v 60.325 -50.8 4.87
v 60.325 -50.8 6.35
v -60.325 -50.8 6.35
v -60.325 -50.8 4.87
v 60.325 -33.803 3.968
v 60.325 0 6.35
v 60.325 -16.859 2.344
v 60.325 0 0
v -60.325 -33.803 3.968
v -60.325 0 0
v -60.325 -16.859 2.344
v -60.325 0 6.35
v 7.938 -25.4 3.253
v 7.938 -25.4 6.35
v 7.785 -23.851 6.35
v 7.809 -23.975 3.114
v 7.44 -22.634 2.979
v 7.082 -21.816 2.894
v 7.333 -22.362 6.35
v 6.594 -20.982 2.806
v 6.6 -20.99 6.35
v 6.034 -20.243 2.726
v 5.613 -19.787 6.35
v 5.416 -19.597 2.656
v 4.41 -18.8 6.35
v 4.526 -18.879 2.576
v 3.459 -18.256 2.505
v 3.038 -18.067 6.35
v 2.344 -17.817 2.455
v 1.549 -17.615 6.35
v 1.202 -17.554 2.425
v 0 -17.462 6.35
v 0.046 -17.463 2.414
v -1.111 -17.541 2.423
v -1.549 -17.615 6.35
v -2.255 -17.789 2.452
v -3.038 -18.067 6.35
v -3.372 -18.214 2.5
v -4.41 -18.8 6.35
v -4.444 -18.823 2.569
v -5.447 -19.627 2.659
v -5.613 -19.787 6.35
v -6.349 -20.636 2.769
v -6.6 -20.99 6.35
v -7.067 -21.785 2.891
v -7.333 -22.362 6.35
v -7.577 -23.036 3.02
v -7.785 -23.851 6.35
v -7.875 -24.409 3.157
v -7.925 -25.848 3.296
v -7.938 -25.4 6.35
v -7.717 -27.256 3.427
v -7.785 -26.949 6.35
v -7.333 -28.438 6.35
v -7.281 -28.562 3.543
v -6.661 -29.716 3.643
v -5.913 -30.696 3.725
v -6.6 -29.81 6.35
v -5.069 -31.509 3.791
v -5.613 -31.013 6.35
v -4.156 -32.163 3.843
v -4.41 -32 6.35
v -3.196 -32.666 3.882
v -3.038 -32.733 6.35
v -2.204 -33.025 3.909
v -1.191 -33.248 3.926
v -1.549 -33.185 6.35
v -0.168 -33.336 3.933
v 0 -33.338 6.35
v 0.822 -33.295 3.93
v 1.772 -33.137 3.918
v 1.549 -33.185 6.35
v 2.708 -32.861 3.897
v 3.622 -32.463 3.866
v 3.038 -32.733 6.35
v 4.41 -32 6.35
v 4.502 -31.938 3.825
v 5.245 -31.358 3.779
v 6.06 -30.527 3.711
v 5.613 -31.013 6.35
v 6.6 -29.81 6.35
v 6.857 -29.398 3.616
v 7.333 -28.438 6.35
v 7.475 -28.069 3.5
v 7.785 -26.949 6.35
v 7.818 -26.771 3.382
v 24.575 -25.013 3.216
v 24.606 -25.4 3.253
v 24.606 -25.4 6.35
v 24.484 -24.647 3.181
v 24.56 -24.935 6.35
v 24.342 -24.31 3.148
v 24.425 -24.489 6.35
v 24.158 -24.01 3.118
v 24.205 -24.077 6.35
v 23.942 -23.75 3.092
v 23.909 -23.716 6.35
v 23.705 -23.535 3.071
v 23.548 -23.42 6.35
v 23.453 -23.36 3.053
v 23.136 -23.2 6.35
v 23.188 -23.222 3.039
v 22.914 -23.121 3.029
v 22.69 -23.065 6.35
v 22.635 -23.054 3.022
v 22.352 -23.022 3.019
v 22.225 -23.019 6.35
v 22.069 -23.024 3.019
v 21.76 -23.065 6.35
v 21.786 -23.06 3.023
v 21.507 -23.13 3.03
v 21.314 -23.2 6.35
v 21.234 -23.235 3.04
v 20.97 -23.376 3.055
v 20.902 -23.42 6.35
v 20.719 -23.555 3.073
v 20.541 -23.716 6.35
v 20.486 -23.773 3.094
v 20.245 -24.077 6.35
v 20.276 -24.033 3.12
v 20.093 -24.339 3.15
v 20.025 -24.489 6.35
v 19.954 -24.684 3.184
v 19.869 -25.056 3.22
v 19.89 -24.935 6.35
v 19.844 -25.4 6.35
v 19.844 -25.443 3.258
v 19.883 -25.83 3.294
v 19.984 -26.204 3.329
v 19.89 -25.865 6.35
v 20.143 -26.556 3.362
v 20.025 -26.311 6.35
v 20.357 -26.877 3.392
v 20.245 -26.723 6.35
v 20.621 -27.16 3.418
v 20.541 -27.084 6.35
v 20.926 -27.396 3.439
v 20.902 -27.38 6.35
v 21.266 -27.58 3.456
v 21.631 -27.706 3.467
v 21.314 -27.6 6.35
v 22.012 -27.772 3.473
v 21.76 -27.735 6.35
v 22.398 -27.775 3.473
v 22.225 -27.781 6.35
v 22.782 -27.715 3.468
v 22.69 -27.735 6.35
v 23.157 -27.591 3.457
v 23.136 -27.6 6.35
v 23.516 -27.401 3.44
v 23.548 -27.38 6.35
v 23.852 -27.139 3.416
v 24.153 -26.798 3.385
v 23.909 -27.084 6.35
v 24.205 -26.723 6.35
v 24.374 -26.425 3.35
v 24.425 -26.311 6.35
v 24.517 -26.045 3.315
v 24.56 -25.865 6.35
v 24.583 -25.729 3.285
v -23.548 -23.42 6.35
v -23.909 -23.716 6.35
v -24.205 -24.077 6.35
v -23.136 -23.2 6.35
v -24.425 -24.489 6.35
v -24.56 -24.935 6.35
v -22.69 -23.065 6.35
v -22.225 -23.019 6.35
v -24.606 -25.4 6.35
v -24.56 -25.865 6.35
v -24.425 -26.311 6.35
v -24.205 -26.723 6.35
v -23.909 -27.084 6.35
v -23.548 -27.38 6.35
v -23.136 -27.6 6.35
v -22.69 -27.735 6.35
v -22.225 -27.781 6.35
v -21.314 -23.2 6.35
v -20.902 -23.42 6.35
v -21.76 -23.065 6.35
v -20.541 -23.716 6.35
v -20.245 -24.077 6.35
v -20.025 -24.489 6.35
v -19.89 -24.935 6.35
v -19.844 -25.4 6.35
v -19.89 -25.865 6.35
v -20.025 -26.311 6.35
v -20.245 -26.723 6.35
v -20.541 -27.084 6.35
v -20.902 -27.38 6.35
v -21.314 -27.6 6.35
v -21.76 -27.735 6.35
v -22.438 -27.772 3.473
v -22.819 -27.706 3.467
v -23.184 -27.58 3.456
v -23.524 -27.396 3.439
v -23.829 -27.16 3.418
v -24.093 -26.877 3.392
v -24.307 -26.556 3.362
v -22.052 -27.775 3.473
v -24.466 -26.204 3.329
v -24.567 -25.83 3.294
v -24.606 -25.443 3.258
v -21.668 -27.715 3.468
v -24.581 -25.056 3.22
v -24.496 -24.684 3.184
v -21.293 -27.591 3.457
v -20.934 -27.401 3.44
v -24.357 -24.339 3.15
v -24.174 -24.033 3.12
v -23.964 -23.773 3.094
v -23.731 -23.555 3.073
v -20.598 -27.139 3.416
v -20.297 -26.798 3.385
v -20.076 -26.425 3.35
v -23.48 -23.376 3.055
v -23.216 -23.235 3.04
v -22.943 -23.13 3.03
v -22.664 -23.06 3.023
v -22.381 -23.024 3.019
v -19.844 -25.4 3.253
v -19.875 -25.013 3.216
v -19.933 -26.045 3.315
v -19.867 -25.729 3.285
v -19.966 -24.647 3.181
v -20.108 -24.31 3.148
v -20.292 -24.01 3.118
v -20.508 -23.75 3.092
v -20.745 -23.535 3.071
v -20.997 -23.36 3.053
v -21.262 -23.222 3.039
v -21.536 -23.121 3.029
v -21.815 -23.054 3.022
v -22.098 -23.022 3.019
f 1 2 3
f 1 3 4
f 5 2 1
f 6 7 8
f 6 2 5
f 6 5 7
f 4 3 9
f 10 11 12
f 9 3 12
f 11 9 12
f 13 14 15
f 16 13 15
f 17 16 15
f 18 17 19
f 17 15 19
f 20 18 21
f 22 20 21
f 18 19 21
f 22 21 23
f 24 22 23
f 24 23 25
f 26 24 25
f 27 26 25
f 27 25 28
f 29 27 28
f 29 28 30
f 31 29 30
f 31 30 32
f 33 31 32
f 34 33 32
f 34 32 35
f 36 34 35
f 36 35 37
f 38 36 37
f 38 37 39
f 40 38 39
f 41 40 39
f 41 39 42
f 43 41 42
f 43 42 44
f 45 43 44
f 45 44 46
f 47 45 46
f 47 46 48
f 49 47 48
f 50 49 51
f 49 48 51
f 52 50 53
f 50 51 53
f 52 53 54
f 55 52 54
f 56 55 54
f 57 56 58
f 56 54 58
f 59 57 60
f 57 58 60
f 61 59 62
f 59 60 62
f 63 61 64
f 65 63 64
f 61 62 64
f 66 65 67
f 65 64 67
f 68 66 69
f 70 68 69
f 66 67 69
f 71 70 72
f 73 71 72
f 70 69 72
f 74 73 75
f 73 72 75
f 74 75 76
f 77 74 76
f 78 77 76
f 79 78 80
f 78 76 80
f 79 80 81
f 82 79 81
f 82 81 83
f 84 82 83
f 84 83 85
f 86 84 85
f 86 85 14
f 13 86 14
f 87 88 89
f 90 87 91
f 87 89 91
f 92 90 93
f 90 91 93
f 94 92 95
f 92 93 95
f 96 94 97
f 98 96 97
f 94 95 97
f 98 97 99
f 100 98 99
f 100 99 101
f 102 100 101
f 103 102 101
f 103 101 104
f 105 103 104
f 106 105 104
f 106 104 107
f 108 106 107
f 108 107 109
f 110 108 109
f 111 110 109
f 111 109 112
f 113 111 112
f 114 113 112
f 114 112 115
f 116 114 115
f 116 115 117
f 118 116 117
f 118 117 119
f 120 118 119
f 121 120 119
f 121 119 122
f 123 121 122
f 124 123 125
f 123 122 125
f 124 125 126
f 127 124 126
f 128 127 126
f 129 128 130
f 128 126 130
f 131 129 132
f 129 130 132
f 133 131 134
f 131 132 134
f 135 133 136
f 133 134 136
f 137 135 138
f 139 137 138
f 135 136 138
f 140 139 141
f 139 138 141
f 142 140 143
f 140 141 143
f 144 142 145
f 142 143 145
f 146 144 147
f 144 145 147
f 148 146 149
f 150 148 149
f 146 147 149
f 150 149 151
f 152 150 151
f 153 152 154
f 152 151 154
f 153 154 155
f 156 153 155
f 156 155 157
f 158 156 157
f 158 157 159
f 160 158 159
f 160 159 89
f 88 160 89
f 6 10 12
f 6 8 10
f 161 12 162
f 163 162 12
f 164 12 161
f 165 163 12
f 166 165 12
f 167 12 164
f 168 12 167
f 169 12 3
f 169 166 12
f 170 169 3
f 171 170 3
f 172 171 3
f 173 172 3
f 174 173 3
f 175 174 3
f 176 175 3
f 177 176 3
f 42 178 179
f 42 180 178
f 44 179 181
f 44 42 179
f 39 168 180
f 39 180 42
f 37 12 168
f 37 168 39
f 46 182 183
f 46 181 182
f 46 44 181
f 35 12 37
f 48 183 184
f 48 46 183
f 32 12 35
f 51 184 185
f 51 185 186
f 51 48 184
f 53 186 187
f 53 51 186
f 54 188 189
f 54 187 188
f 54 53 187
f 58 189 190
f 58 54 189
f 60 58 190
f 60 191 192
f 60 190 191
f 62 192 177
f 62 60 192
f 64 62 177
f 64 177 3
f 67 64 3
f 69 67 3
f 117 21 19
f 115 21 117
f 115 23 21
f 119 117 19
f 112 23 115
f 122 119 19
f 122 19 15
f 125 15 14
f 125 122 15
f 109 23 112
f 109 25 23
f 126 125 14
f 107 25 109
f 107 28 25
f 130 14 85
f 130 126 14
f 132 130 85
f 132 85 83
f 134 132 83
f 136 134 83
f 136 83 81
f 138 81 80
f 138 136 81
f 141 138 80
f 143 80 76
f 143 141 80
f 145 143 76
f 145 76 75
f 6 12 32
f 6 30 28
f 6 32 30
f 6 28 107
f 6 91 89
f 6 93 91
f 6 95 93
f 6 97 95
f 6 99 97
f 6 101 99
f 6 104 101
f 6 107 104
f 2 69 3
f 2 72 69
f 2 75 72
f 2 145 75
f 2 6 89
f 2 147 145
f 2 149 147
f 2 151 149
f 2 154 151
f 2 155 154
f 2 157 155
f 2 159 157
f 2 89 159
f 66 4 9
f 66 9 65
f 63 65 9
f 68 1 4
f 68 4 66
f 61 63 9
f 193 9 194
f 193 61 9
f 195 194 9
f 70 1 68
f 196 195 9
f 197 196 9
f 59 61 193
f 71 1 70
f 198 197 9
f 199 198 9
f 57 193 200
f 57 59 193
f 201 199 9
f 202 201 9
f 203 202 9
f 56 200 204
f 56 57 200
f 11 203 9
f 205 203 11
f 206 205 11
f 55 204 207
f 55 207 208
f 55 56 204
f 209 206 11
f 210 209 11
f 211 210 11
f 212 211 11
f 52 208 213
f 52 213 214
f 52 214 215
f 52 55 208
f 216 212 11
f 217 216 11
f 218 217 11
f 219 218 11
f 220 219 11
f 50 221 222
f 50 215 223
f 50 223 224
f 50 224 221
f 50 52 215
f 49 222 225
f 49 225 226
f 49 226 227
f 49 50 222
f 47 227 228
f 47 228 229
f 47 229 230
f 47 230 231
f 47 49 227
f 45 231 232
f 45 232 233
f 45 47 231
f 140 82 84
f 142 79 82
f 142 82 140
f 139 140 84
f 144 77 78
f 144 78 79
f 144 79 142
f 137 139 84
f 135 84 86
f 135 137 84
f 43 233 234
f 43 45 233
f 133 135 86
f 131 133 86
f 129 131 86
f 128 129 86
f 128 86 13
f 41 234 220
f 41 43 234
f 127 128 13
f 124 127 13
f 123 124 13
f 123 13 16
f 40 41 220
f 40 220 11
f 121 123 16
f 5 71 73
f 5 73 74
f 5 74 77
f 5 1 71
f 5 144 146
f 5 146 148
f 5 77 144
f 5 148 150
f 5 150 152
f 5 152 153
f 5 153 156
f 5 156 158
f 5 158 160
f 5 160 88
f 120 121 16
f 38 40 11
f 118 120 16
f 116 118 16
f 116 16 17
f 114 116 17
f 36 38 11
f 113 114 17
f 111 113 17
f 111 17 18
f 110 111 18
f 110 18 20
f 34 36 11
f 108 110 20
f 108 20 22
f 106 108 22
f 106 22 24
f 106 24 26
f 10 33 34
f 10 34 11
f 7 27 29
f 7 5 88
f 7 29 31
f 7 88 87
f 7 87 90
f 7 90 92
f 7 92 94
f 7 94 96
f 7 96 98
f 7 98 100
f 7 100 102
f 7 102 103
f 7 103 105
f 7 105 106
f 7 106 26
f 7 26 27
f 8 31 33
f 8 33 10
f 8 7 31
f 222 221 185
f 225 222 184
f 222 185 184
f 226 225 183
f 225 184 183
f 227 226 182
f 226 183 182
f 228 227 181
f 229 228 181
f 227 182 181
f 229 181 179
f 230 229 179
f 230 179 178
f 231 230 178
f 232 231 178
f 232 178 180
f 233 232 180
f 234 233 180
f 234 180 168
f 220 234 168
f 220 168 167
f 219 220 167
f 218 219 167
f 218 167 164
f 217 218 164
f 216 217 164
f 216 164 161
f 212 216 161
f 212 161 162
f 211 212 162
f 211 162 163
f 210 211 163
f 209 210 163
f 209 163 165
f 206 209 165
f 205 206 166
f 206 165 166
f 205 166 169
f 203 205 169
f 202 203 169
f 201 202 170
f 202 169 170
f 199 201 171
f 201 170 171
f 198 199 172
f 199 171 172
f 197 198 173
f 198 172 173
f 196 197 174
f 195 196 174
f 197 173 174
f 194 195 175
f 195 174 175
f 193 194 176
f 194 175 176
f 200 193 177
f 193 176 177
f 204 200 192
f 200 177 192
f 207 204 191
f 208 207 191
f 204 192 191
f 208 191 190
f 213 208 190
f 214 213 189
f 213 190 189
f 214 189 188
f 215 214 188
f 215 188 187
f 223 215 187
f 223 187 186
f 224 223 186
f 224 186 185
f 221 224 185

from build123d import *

# Parameters (mm, degrees)
F1_DEPTH = 60.325
F2_R     = 7.9375
F2_R_2   = 2.38125
F3_DEPTH = 4.9359792052


with BuildPart() as f1:
    # F0 (on Right) → F1 (new body, symmetric)
    with BuildSketch(Plane.YZ):
        with BuildLine():
            Line((0, 0), (0, 6.35))
            Line((0, 6.35), (-50.8, 6.35))
            Line((-50.8, 6.35), (-50.8, 4.8701947642))
            ThreePointArc((-50.8, 4.8701947642), (-25.322261732, 3.2459692683), (0, 0))
        make_face()
    extrude(amount=F1_DEPTH, both=True)

    # F2 (on face) → F3 (cut, up to face)
    with BuildSketch(Plane.XY.offset(6.35)):
        with Locations((0, -25.4)):
            Circle(F2_R)
        with Locations((-22.225, -25.4)):
            Circle(F2_R_2)
        with Locations((22.225, -25.4)):
            Circle(F2_R_2)
    extrude(amount=-F3_DEPTH, mode=Mode.SUBTRACT)


solid = f1.part
